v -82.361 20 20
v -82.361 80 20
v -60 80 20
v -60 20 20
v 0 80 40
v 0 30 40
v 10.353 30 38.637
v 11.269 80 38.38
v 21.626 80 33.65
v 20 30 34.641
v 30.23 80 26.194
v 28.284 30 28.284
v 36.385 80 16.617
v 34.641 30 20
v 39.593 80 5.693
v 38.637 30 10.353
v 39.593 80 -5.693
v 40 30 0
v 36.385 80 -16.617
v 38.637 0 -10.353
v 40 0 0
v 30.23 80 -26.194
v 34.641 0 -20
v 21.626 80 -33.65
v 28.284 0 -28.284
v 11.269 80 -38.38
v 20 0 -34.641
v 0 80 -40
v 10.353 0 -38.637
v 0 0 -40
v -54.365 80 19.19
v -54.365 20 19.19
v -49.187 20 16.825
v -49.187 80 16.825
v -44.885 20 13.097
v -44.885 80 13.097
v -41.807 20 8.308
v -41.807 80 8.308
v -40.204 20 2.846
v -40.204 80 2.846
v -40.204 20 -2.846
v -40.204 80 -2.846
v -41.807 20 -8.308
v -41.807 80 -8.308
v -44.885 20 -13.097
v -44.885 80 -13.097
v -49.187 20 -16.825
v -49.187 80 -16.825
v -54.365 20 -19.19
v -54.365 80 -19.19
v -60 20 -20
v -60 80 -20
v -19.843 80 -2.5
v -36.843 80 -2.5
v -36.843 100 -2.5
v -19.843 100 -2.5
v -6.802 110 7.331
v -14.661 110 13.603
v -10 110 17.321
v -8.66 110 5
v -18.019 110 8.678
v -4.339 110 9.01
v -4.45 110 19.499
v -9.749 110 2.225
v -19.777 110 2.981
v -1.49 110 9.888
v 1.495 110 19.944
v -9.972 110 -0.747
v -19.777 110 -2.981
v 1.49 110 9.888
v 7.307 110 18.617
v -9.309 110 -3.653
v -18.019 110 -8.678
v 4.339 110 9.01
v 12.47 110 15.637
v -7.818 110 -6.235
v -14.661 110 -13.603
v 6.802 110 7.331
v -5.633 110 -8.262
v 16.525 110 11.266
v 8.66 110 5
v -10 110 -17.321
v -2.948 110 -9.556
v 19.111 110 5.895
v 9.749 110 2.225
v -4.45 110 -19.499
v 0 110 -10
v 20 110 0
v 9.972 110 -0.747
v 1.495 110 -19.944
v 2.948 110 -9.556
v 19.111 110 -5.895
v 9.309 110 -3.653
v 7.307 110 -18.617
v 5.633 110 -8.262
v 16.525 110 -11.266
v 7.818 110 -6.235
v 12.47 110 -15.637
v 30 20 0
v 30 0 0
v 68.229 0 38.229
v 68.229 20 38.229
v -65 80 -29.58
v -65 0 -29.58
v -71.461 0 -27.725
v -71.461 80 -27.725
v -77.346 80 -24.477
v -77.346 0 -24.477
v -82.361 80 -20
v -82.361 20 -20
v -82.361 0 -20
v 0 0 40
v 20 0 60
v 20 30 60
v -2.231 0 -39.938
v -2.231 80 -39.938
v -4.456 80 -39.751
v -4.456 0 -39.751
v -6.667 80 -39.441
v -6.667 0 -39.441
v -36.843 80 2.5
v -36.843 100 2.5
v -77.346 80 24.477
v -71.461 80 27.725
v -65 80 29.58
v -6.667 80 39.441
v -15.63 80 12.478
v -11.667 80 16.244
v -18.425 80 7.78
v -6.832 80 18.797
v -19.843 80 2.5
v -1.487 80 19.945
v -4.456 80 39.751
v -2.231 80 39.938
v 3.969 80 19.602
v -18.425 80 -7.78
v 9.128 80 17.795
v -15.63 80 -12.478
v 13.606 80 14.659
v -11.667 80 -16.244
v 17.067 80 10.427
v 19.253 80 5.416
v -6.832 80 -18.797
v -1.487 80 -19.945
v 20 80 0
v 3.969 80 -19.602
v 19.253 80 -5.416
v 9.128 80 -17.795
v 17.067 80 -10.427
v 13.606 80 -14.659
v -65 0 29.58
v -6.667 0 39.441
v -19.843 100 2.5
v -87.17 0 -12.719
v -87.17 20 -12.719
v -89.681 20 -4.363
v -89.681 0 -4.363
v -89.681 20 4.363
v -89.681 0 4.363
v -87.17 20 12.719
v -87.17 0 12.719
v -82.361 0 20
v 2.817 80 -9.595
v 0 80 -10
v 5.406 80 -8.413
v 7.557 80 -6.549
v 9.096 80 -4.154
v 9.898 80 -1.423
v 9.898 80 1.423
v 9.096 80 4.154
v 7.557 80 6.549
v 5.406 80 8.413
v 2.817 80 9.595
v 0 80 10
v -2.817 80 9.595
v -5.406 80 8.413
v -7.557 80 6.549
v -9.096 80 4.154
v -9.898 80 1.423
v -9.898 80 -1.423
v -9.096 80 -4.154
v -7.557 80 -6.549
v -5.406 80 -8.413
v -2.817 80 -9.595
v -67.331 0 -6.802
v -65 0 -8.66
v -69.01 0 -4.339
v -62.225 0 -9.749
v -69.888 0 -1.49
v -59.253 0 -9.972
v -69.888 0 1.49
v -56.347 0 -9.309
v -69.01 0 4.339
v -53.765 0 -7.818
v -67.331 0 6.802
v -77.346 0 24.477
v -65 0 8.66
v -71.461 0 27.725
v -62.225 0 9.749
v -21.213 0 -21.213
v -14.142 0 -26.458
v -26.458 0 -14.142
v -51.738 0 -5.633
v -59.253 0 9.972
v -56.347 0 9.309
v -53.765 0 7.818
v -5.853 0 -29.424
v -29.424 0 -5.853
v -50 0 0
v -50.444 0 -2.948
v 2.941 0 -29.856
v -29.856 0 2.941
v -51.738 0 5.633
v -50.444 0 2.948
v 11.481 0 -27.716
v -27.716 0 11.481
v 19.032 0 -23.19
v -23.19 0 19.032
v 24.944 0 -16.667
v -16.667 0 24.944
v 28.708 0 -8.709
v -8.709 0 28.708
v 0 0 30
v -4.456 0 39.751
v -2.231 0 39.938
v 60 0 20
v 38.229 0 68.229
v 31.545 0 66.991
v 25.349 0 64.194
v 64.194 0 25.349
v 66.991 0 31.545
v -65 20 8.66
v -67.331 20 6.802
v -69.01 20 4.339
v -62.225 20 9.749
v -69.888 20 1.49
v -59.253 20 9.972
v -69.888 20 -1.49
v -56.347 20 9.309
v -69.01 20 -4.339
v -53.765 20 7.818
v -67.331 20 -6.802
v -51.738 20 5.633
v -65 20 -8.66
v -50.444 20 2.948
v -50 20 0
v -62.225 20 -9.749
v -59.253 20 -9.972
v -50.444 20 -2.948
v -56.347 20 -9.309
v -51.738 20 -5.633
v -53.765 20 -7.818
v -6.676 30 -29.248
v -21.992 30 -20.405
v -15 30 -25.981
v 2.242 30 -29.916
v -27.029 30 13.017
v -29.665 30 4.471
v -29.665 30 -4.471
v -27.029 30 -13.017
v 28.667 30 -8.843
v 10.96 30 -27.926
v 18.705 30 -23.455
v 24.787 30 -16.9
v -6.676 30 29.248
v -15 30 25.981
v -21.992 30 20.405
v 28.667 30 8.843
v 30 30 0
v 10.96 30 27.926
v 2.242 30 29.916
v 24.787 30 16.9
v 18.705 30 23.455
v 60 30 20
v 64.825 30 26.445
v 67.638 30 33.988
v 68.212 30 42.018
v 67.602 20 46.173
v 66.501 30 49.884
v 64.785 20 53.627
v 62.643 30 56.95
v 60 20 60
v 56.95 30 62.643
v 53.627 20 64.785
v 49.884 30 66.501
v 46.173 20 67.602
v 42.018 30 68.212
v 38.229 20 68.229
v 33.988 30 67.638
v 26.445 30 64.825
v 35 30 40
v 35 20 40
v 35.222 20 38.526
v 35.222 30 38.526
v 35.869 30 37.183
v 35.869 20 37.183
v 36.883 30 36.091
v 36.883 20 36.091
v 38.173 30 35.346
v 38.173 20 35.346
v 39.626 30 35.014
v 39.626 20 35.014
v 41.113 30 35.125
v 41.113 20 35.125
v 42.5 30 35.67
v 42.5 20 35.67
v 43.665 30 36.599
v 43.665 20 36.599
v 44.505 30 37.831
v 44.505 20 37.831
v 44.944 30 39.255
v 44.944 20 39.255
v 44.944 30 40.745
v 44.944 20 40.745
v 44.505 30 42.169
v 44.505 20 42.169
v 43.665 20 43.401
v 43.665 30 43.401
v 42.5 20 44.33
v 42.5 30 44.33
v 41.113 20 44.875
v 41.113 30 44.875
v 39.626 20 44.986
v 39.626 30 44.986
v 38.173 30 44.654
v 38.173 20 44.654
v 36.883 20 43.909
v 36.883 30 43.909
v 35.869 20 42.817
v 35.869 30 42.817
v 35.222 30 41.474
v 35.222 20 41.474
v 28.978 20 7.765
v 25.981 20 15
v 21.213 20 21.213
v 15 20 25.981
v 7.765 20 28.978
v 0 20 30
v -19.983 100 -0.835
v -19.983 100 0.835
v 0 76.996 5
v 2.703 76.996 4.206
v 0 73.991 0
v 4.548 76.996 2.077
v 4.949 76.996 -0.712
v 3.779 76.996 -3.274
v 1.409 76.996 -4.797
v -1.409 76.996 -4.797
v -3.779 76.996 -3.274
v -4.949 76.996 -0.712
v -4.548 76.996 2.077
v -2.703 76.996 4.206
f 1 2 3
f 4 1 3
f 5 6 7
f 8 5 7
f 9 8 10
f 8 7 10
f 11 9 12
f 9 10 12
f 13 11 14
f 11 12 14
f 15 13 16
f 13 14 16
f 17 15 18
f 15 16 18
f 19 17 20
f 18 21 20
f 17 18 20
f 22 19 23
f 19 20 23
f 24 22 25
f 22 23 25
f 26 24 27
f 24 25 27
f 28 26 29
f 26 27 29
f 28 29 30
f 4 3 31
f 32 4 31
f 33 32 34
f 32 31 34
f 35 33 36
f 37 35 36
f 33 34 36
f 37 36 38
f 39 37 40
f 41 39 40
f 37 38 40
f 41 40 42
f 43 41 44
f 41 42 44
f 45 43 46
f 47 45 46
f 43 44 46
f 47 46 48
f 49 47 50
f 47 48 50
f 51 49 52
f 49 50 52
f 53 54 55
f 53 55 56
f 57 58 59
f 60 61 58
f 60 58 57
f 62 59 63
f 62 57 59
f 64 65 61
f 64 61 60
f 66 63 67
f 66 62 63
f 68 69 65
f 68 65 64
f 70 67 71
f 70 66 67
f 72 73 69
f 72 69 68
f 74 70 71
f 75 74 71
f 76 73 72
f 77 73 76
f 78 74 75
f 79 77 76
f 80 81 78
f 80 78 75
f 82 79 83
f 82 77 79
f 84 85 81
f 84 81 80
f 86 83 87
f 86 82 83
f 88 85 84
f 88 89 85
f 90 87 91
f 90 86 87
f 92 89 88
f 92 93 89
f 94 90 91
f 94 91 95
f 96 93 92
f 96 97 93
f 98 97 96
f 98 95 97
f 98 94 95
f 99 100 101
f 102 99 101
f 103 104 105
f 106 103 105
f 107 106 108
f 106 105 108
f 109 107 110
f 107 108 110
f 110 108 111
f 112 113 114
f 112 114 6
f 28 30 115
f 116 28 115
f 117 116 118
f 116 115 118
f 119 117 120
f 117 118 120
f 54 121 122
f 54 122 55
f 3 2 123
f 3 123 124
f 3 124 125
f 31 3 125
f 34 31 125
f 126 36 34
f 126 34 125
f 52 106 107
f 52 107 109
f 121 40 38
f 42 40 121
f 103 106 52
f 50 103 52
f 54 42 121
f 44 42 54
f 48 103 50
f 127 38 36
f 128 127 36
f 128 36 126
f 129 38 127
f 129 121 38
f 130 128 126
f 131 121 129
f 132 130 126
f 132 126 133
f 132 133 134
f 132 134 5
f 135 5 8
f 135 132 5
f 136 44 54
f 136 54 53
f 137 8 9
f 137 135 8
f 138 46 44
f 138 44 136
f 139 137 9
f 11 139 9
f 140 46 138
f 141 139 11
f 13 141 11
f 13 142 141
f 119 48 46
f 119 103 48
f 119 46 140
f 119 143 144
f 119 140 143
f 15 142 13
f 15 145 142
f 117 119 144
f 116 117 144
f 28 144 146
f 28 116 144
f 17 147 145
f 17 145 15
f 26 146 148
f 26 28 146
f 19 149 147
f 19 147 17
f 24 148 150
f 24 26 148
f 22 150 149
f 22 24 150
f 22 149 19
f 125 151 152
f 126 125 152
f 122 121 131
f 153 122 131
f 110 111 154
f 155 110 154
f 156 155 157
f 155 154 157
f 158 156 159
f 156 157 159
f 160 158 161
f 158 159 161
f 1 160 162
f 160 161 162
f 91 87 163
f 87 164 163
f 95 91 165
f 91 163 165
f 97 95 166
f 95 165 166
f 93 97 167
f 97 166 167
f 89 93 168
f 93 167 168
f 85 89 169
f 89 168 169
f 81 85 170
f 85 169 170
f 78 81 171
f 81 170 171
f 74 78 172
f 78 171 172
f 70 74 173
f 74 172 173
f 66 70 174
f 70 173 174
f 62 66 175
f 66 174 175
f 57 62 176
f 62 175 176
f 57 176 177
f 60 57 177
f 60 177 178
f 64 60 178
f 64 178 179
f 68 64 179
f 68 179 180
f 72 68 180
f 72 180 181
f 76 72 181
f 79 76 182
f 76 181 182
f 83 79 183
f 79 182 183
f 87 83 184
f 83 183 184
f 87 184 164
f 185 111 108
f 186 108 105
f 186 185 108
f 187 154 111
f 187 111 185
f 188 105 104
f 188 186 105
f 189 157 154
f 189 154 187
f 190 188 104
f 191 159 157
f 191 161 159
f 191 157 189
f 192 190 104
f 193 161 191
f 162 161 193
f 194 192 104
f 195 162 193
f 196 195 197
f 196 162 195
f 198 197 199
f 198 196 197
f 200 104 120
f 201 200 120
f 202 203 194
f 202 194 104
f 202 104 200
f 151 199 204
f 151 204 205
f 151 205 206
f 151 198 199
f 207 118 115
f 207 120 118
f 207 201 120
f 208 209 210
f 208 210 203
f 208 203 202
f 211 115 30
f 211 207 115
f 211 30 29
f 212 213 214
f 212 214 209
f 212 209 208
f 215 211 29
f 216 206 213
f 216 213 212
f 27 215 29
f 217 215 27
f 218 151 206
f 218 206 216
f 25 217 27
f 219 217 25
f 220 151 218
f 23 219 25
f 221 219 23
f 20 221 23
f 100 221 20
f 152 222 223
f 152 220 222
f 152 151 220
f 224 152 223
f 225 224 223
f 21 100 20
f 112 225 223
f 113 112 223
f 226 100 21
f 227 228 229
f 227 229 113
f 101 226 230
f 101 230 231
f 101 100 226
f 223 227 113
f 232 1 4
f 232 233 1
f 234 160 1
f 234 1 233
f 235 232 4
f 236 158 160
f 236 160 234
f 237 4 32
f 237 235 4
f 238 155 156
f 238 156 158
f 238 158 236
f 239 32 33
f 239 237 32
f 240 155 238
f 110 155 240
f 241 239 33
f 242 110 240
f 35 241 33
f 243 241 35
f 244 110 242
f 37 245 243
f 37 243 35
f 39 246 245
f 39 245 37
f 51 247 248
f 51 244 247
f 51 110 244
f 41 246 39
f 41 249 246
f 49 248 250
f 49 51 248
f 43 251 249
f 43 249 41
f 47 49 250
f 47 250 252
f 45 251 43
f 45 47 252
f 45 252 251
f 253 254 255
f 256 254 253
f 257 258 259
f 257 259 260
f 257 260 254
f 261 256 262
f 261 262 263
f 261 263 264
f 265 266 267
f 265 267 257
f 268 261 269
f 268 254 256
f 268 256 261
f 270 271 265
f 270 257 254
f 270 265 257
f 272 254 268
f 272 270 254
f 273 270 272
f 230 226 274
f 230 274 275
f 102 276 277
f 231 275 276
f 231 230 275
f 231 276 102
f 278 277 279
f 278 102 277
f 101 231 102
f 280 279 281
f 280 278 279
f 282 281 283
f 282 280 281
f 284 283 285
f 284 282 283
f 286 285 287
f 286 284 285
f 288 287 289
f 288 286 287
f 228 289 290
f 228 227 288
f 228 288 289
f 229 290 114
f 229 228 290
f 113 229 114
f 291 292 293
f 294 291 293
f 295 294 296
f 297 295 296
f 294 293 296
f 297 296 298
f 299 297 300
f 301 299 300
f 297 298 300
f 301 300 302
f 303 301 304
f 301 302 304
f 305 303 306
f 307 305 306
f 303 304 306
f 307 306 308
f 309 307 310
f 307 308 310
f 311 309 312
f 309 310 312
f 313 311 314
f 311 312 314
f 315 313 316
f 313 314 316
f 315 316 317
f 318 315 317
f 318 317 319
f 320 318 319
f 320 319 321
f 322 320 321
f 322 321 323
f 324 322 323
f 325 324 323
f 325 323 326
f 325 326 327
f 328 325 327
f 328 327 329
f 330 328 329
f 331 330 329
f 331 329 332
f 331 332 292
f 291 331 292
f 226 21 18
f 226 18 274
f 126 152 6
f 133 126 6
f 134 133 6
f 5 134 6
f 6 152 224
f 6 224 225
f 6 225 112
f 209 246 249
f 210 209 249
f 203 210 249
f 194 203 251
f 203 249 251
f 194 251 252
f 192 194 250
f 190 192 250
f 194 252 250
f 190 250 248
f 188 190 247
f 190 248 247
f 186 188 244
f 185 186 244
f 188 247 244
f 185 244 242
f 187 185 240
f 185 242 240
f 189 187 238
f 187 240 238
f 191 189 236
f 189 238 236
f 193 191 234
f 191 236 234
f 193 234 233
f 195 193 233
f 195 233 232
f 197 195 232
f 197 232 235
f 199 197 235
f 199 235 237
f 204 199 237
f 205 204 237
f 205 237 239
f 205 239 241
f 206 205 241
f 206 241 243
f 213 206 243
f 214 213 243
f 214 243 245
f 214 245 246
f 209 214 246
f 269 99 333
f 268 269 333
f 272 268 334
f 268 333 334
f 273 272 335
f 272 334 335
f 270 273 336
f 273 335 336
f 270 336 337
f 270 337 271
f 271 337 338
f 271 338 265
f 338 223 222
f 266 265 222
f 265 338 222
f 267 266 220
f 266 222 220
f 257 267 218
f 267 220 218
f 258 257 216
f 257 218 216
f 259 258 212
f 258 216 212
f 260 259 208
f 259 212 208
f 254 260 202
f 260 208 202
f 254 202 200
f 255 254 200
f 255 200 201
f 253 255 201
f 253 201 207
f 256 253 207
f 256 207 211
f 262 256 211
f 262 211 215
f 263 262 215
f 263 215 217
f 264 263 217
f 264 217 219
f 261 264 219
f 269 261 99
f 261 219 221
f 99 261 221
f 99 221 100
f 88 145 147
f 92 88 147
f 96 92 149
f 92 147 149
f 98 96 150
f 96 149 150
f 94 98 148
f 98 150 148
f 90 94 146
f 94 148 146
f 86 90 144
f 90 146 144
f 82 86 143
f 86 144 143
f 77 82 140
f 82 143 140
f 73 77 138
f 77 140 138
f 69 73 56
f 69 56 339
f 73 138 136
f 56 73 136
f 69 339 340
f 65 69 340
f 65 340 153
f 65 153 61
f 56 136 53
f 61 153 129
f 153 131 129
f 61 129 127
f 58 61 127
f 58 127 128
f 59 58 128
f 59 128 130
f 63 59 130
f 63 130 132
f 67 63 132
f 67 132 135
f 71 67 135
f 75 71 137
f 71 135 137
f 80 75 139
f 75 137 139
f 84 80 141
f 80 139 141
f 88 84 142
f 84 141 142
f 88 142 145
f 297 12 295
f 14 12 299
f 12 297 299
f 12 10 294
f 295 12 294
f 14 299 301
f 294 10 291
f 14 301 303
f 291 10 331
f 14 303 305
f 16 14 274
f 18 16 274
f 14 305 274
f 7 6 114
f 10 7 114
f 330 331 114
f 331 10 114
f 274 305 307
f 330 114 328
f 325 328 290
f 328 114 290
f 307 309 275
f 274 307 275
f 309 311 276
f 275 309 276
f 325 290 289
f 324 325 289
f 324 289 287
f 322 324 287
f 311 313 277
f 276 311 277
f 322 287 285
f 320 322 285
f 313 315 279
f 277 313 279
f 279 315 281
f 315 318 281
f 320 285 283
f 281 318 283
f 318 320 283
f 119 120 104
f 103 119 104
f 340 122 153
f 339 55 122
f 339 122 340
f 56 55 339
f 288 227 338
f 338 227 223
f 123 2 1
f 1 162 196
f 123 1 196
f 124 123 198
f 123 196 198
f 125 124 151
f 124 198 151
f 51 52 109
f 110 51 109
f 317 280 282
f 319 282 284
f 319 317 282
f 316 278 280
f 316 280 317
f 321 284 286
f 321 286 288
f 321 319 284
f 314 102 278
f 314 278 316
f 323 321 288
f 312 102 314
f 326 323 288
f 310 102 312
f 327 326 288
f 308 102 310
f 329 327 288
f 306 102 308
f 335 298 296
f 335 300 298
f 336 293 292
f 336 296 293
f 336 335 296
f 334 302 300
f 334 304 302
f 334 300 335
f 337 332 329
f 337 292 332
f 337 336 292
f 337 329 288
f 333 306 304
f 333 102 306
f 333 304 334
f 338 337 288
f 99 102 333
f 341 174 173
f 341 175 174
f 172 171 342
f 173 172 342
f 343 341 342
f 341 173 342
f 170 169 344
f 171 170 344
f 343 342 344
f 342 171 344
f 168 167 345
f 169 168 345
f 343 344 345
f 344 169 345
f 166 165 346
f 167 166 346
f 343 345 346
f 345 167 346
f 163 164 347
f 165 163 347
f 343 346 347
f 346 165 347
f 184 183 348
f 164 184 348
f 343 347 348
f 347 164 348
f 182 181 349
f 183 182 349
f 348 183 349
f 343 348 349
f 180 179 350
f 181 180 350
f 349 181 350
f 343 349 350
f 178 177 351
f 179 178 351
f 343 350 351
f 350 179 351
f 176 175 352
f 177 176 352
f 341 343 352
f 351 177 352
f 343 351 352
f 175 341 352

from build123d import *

# Parameters (mm, degrees)
BOSS_EXTRUDE1_DEPTH        = 80
SKETCH2_R                  = 30
CUT_EXTRUDE1_DEPTH         = 30
SKETCH3_R                  = 20
BOSS_EXTRUDE2_DEPTH        = 30
F_20_0MM_DOWEL_HOLE1_D     = 20
F_20_0MM_DOWEL_HOLE1_DEPTH = 30
F_20_0MM_DOWEL_HOLE1_TIP   = 6.00860619
SKETCH6_R                  = 10
CUT_EXTRUDE2_DEPTH         = 109
SKETCH7_R                  = 10
CUT_EXTRUDE3_DEPTH         = 60
BOSS_EXTRUDE3_DEPTH        = 30
SKETCH11_R                 = 5
CUT_EXTRUDE4_DEPTH         = 30
SKETCH13_R                 = 5
CUT_EXTRUDE5_DEPTH         = 20
SKETCH14_W                 = 17
SKETCH14_H                 = 5
BOSS_EXTRUDE4_DEPTH        = 20


with BuildPart() as part:
    # Sketch1 → Boss-Extrude1 (new body)
    with BuildSketch(Plane(origin=(0, 0, 0), x_dir=(1, 0, 0), z_dir=(0, 1, 0))):
        with BuildLine():
            Line((-6.666666667, 39.440531887), (-65, 29.580398915))
            ThreePointArc((-65, 29.580398915), (-74.494747679, 26.265991124), (-82.360679775, 20))
            ThreePointArc((-82.360679775, 20), (-90, 0), (-82.360679775, -20))
            ThreePointArc((-82.360679775, -20), (-74.494747679, -26.265991124), (-65, -29.580398915))
            Line((-65, -29.580398915), (-6.666666667, -39.440531887))
            ThreePointArc((-6.666666667, -39.440531887), (-3.345050411, -39.859887578), (0, -40))
            ThreePointArc((0, -40), (40, 0), (0, 40))
            ThreePointArc((0, 40), (-3.345050411, 39.859887578), (-6.666666667, 39.440531887))
        make_face()
    extrude(amount=BOSS_EXTRUDE1_DEPTH)

    # Sketch2 → Cut-Extrude1 (cut)
    with BuildSketch(Plane.XZ):
        Circle(SKETCH2_R)
    extrude(amount=-CUT_EXTRUDE1_DEPTH, mode=Mode.SUBTRACT)

    # Sketch3 → Boss-Extrude2 (add)
    with BuildSketch(Plane(origin=(0, 80, 0), x_dir=(1, 0, 0), z_dir=(0, 1, 0))):
        Circle(SKETCH3_R)
    extrude(amount=BOSS_EXTRUDE2_DEPTH)

    # Ø20.0mm Dowel Hole1
    with Locations(Plane.ZX.offset(110)):
        with Locations((0, 0)):
            Hole(F_20_0MM_DOWEL_HOLE1_D / 2, depth=F_20_0MM_DOWEL_HOLE1_DEPTH)
            with Locations((0, 0, -(F_20_0MM_DOWEL_HOLE1_DEPTH + F_20_0MM_DOWEL_HOLE1_TIP / 2))):  # 118° drill point
                Cone(0, F_20_0MM_DOWEL_HOLE1_D / 2, F_20_0MM_DOWEL_HOLE1_TIP, mode=Mode.SUBTRACT)

    # Sketch6 → Cut-Extrude2 (cut)
    with BuildSketch(Plane(origin=(0, 80, 0), x_dir=(1, 0, 0), z_dir=(0, 1, 0))):
        with Locations((-60, 0)):
            Circle(SKETCH6_R)
    extrude(amount=-CUT_EXTRUDE2_DEPTH, mode=Mode.SUBTRACT)

    # Sketch7 → Cut-Extrude3 (cut)
    with BuildSketch(Plane(origin=(0, 80, 0), x_dir=(1, 0, 0), z_dir=(0, 1, 0))):
        with BuildLine():
            ThreePointArc((-60, -20), (-40, 0), (-60, 20))
            Line((-60, 20), (-82.360679775, 20))
            ThreePointArc((-82.360679775, 20), (-90, 0), (-82.360679775, -20))
            Line((-82.360679775, -20), (-60, -20))
        make_face()
        with Locations((-60, 0)):
            Circle(SKETCH7_R, mode=Mode.SUBTRACT)
    extrude(amount=-CUT_EXTRUDE3_DEPTH, mode=Mode.SUBTRACT)

    # Sketch10 → Boss-Extrude3 (add)
    with BuildSketch(Plane.XZ):
        with BuildLine():
            Line((20, 60), (0, 40))
            ThreePointArc((0, 40), (28.284271247, 28.284271247), (40, 0))
            Line((40, 0), (60, 20))
            ThreePointArc((60, 20), (60, 60), (20, 60))
        make_face()
    extrude(amount=-BOSS_EXTRUDE3_DEPTH)

    # Sketch11 → Cut-Extrude4 (cut)
    with BuildSketch(Plane(origin=(0, 0, 0), x_dir=(-1, 0, 0), z_dir=(0, -1, 0))):
        with Locations((-40, -40)):
            Circle(SKETCH11_R)
    extrude(amount=-CUT_EXTRUDE4_DEPTH, mode=Mode.SUBTRACT)

    # Sketch13 → Cut-Extrude5 (cut)
    with BuildSketch(Plane(origin=(0, 0, 0), x_dir=(-1, 0, 0), z_dir=(0, -1, 0))):
        with BuildLine():
            ThreePointArc((-68.228756555, -38.228756555), (-60, -60), (-38.228756555, -68.228756555))
            Line((-38.228756555, -68.228756555), (0, -30))
            ThreePointArc((0, -30), (-21.213203436, -21.213203436), (-30, 0))
            Line((-30, 0), (-68.228756555, -38.228756555))
        make_face()
        with Locations((-40, -40)):
            Circle(SKETCH13_R, mode=Mode.SUBTRACT)
    extrude(amount=-CUT_EXTRUDE5_DEPTH, mode=Mode.SUBTRACT)

    # Sketch14 → Boss-Extrude4 (add)
    with BuildSketch(Plane(origin=(0, 80, 0), x_dir=(1, 0, 0), z_dir=(0, 1, 0))):
        with Locations((-28.343134833, 0)):
            Rectangle(SKETCH14_W, SKETCH14_H)
    extrude(amount=BOSS_EXTRUDE4_DEPTH)


solid = part.part
